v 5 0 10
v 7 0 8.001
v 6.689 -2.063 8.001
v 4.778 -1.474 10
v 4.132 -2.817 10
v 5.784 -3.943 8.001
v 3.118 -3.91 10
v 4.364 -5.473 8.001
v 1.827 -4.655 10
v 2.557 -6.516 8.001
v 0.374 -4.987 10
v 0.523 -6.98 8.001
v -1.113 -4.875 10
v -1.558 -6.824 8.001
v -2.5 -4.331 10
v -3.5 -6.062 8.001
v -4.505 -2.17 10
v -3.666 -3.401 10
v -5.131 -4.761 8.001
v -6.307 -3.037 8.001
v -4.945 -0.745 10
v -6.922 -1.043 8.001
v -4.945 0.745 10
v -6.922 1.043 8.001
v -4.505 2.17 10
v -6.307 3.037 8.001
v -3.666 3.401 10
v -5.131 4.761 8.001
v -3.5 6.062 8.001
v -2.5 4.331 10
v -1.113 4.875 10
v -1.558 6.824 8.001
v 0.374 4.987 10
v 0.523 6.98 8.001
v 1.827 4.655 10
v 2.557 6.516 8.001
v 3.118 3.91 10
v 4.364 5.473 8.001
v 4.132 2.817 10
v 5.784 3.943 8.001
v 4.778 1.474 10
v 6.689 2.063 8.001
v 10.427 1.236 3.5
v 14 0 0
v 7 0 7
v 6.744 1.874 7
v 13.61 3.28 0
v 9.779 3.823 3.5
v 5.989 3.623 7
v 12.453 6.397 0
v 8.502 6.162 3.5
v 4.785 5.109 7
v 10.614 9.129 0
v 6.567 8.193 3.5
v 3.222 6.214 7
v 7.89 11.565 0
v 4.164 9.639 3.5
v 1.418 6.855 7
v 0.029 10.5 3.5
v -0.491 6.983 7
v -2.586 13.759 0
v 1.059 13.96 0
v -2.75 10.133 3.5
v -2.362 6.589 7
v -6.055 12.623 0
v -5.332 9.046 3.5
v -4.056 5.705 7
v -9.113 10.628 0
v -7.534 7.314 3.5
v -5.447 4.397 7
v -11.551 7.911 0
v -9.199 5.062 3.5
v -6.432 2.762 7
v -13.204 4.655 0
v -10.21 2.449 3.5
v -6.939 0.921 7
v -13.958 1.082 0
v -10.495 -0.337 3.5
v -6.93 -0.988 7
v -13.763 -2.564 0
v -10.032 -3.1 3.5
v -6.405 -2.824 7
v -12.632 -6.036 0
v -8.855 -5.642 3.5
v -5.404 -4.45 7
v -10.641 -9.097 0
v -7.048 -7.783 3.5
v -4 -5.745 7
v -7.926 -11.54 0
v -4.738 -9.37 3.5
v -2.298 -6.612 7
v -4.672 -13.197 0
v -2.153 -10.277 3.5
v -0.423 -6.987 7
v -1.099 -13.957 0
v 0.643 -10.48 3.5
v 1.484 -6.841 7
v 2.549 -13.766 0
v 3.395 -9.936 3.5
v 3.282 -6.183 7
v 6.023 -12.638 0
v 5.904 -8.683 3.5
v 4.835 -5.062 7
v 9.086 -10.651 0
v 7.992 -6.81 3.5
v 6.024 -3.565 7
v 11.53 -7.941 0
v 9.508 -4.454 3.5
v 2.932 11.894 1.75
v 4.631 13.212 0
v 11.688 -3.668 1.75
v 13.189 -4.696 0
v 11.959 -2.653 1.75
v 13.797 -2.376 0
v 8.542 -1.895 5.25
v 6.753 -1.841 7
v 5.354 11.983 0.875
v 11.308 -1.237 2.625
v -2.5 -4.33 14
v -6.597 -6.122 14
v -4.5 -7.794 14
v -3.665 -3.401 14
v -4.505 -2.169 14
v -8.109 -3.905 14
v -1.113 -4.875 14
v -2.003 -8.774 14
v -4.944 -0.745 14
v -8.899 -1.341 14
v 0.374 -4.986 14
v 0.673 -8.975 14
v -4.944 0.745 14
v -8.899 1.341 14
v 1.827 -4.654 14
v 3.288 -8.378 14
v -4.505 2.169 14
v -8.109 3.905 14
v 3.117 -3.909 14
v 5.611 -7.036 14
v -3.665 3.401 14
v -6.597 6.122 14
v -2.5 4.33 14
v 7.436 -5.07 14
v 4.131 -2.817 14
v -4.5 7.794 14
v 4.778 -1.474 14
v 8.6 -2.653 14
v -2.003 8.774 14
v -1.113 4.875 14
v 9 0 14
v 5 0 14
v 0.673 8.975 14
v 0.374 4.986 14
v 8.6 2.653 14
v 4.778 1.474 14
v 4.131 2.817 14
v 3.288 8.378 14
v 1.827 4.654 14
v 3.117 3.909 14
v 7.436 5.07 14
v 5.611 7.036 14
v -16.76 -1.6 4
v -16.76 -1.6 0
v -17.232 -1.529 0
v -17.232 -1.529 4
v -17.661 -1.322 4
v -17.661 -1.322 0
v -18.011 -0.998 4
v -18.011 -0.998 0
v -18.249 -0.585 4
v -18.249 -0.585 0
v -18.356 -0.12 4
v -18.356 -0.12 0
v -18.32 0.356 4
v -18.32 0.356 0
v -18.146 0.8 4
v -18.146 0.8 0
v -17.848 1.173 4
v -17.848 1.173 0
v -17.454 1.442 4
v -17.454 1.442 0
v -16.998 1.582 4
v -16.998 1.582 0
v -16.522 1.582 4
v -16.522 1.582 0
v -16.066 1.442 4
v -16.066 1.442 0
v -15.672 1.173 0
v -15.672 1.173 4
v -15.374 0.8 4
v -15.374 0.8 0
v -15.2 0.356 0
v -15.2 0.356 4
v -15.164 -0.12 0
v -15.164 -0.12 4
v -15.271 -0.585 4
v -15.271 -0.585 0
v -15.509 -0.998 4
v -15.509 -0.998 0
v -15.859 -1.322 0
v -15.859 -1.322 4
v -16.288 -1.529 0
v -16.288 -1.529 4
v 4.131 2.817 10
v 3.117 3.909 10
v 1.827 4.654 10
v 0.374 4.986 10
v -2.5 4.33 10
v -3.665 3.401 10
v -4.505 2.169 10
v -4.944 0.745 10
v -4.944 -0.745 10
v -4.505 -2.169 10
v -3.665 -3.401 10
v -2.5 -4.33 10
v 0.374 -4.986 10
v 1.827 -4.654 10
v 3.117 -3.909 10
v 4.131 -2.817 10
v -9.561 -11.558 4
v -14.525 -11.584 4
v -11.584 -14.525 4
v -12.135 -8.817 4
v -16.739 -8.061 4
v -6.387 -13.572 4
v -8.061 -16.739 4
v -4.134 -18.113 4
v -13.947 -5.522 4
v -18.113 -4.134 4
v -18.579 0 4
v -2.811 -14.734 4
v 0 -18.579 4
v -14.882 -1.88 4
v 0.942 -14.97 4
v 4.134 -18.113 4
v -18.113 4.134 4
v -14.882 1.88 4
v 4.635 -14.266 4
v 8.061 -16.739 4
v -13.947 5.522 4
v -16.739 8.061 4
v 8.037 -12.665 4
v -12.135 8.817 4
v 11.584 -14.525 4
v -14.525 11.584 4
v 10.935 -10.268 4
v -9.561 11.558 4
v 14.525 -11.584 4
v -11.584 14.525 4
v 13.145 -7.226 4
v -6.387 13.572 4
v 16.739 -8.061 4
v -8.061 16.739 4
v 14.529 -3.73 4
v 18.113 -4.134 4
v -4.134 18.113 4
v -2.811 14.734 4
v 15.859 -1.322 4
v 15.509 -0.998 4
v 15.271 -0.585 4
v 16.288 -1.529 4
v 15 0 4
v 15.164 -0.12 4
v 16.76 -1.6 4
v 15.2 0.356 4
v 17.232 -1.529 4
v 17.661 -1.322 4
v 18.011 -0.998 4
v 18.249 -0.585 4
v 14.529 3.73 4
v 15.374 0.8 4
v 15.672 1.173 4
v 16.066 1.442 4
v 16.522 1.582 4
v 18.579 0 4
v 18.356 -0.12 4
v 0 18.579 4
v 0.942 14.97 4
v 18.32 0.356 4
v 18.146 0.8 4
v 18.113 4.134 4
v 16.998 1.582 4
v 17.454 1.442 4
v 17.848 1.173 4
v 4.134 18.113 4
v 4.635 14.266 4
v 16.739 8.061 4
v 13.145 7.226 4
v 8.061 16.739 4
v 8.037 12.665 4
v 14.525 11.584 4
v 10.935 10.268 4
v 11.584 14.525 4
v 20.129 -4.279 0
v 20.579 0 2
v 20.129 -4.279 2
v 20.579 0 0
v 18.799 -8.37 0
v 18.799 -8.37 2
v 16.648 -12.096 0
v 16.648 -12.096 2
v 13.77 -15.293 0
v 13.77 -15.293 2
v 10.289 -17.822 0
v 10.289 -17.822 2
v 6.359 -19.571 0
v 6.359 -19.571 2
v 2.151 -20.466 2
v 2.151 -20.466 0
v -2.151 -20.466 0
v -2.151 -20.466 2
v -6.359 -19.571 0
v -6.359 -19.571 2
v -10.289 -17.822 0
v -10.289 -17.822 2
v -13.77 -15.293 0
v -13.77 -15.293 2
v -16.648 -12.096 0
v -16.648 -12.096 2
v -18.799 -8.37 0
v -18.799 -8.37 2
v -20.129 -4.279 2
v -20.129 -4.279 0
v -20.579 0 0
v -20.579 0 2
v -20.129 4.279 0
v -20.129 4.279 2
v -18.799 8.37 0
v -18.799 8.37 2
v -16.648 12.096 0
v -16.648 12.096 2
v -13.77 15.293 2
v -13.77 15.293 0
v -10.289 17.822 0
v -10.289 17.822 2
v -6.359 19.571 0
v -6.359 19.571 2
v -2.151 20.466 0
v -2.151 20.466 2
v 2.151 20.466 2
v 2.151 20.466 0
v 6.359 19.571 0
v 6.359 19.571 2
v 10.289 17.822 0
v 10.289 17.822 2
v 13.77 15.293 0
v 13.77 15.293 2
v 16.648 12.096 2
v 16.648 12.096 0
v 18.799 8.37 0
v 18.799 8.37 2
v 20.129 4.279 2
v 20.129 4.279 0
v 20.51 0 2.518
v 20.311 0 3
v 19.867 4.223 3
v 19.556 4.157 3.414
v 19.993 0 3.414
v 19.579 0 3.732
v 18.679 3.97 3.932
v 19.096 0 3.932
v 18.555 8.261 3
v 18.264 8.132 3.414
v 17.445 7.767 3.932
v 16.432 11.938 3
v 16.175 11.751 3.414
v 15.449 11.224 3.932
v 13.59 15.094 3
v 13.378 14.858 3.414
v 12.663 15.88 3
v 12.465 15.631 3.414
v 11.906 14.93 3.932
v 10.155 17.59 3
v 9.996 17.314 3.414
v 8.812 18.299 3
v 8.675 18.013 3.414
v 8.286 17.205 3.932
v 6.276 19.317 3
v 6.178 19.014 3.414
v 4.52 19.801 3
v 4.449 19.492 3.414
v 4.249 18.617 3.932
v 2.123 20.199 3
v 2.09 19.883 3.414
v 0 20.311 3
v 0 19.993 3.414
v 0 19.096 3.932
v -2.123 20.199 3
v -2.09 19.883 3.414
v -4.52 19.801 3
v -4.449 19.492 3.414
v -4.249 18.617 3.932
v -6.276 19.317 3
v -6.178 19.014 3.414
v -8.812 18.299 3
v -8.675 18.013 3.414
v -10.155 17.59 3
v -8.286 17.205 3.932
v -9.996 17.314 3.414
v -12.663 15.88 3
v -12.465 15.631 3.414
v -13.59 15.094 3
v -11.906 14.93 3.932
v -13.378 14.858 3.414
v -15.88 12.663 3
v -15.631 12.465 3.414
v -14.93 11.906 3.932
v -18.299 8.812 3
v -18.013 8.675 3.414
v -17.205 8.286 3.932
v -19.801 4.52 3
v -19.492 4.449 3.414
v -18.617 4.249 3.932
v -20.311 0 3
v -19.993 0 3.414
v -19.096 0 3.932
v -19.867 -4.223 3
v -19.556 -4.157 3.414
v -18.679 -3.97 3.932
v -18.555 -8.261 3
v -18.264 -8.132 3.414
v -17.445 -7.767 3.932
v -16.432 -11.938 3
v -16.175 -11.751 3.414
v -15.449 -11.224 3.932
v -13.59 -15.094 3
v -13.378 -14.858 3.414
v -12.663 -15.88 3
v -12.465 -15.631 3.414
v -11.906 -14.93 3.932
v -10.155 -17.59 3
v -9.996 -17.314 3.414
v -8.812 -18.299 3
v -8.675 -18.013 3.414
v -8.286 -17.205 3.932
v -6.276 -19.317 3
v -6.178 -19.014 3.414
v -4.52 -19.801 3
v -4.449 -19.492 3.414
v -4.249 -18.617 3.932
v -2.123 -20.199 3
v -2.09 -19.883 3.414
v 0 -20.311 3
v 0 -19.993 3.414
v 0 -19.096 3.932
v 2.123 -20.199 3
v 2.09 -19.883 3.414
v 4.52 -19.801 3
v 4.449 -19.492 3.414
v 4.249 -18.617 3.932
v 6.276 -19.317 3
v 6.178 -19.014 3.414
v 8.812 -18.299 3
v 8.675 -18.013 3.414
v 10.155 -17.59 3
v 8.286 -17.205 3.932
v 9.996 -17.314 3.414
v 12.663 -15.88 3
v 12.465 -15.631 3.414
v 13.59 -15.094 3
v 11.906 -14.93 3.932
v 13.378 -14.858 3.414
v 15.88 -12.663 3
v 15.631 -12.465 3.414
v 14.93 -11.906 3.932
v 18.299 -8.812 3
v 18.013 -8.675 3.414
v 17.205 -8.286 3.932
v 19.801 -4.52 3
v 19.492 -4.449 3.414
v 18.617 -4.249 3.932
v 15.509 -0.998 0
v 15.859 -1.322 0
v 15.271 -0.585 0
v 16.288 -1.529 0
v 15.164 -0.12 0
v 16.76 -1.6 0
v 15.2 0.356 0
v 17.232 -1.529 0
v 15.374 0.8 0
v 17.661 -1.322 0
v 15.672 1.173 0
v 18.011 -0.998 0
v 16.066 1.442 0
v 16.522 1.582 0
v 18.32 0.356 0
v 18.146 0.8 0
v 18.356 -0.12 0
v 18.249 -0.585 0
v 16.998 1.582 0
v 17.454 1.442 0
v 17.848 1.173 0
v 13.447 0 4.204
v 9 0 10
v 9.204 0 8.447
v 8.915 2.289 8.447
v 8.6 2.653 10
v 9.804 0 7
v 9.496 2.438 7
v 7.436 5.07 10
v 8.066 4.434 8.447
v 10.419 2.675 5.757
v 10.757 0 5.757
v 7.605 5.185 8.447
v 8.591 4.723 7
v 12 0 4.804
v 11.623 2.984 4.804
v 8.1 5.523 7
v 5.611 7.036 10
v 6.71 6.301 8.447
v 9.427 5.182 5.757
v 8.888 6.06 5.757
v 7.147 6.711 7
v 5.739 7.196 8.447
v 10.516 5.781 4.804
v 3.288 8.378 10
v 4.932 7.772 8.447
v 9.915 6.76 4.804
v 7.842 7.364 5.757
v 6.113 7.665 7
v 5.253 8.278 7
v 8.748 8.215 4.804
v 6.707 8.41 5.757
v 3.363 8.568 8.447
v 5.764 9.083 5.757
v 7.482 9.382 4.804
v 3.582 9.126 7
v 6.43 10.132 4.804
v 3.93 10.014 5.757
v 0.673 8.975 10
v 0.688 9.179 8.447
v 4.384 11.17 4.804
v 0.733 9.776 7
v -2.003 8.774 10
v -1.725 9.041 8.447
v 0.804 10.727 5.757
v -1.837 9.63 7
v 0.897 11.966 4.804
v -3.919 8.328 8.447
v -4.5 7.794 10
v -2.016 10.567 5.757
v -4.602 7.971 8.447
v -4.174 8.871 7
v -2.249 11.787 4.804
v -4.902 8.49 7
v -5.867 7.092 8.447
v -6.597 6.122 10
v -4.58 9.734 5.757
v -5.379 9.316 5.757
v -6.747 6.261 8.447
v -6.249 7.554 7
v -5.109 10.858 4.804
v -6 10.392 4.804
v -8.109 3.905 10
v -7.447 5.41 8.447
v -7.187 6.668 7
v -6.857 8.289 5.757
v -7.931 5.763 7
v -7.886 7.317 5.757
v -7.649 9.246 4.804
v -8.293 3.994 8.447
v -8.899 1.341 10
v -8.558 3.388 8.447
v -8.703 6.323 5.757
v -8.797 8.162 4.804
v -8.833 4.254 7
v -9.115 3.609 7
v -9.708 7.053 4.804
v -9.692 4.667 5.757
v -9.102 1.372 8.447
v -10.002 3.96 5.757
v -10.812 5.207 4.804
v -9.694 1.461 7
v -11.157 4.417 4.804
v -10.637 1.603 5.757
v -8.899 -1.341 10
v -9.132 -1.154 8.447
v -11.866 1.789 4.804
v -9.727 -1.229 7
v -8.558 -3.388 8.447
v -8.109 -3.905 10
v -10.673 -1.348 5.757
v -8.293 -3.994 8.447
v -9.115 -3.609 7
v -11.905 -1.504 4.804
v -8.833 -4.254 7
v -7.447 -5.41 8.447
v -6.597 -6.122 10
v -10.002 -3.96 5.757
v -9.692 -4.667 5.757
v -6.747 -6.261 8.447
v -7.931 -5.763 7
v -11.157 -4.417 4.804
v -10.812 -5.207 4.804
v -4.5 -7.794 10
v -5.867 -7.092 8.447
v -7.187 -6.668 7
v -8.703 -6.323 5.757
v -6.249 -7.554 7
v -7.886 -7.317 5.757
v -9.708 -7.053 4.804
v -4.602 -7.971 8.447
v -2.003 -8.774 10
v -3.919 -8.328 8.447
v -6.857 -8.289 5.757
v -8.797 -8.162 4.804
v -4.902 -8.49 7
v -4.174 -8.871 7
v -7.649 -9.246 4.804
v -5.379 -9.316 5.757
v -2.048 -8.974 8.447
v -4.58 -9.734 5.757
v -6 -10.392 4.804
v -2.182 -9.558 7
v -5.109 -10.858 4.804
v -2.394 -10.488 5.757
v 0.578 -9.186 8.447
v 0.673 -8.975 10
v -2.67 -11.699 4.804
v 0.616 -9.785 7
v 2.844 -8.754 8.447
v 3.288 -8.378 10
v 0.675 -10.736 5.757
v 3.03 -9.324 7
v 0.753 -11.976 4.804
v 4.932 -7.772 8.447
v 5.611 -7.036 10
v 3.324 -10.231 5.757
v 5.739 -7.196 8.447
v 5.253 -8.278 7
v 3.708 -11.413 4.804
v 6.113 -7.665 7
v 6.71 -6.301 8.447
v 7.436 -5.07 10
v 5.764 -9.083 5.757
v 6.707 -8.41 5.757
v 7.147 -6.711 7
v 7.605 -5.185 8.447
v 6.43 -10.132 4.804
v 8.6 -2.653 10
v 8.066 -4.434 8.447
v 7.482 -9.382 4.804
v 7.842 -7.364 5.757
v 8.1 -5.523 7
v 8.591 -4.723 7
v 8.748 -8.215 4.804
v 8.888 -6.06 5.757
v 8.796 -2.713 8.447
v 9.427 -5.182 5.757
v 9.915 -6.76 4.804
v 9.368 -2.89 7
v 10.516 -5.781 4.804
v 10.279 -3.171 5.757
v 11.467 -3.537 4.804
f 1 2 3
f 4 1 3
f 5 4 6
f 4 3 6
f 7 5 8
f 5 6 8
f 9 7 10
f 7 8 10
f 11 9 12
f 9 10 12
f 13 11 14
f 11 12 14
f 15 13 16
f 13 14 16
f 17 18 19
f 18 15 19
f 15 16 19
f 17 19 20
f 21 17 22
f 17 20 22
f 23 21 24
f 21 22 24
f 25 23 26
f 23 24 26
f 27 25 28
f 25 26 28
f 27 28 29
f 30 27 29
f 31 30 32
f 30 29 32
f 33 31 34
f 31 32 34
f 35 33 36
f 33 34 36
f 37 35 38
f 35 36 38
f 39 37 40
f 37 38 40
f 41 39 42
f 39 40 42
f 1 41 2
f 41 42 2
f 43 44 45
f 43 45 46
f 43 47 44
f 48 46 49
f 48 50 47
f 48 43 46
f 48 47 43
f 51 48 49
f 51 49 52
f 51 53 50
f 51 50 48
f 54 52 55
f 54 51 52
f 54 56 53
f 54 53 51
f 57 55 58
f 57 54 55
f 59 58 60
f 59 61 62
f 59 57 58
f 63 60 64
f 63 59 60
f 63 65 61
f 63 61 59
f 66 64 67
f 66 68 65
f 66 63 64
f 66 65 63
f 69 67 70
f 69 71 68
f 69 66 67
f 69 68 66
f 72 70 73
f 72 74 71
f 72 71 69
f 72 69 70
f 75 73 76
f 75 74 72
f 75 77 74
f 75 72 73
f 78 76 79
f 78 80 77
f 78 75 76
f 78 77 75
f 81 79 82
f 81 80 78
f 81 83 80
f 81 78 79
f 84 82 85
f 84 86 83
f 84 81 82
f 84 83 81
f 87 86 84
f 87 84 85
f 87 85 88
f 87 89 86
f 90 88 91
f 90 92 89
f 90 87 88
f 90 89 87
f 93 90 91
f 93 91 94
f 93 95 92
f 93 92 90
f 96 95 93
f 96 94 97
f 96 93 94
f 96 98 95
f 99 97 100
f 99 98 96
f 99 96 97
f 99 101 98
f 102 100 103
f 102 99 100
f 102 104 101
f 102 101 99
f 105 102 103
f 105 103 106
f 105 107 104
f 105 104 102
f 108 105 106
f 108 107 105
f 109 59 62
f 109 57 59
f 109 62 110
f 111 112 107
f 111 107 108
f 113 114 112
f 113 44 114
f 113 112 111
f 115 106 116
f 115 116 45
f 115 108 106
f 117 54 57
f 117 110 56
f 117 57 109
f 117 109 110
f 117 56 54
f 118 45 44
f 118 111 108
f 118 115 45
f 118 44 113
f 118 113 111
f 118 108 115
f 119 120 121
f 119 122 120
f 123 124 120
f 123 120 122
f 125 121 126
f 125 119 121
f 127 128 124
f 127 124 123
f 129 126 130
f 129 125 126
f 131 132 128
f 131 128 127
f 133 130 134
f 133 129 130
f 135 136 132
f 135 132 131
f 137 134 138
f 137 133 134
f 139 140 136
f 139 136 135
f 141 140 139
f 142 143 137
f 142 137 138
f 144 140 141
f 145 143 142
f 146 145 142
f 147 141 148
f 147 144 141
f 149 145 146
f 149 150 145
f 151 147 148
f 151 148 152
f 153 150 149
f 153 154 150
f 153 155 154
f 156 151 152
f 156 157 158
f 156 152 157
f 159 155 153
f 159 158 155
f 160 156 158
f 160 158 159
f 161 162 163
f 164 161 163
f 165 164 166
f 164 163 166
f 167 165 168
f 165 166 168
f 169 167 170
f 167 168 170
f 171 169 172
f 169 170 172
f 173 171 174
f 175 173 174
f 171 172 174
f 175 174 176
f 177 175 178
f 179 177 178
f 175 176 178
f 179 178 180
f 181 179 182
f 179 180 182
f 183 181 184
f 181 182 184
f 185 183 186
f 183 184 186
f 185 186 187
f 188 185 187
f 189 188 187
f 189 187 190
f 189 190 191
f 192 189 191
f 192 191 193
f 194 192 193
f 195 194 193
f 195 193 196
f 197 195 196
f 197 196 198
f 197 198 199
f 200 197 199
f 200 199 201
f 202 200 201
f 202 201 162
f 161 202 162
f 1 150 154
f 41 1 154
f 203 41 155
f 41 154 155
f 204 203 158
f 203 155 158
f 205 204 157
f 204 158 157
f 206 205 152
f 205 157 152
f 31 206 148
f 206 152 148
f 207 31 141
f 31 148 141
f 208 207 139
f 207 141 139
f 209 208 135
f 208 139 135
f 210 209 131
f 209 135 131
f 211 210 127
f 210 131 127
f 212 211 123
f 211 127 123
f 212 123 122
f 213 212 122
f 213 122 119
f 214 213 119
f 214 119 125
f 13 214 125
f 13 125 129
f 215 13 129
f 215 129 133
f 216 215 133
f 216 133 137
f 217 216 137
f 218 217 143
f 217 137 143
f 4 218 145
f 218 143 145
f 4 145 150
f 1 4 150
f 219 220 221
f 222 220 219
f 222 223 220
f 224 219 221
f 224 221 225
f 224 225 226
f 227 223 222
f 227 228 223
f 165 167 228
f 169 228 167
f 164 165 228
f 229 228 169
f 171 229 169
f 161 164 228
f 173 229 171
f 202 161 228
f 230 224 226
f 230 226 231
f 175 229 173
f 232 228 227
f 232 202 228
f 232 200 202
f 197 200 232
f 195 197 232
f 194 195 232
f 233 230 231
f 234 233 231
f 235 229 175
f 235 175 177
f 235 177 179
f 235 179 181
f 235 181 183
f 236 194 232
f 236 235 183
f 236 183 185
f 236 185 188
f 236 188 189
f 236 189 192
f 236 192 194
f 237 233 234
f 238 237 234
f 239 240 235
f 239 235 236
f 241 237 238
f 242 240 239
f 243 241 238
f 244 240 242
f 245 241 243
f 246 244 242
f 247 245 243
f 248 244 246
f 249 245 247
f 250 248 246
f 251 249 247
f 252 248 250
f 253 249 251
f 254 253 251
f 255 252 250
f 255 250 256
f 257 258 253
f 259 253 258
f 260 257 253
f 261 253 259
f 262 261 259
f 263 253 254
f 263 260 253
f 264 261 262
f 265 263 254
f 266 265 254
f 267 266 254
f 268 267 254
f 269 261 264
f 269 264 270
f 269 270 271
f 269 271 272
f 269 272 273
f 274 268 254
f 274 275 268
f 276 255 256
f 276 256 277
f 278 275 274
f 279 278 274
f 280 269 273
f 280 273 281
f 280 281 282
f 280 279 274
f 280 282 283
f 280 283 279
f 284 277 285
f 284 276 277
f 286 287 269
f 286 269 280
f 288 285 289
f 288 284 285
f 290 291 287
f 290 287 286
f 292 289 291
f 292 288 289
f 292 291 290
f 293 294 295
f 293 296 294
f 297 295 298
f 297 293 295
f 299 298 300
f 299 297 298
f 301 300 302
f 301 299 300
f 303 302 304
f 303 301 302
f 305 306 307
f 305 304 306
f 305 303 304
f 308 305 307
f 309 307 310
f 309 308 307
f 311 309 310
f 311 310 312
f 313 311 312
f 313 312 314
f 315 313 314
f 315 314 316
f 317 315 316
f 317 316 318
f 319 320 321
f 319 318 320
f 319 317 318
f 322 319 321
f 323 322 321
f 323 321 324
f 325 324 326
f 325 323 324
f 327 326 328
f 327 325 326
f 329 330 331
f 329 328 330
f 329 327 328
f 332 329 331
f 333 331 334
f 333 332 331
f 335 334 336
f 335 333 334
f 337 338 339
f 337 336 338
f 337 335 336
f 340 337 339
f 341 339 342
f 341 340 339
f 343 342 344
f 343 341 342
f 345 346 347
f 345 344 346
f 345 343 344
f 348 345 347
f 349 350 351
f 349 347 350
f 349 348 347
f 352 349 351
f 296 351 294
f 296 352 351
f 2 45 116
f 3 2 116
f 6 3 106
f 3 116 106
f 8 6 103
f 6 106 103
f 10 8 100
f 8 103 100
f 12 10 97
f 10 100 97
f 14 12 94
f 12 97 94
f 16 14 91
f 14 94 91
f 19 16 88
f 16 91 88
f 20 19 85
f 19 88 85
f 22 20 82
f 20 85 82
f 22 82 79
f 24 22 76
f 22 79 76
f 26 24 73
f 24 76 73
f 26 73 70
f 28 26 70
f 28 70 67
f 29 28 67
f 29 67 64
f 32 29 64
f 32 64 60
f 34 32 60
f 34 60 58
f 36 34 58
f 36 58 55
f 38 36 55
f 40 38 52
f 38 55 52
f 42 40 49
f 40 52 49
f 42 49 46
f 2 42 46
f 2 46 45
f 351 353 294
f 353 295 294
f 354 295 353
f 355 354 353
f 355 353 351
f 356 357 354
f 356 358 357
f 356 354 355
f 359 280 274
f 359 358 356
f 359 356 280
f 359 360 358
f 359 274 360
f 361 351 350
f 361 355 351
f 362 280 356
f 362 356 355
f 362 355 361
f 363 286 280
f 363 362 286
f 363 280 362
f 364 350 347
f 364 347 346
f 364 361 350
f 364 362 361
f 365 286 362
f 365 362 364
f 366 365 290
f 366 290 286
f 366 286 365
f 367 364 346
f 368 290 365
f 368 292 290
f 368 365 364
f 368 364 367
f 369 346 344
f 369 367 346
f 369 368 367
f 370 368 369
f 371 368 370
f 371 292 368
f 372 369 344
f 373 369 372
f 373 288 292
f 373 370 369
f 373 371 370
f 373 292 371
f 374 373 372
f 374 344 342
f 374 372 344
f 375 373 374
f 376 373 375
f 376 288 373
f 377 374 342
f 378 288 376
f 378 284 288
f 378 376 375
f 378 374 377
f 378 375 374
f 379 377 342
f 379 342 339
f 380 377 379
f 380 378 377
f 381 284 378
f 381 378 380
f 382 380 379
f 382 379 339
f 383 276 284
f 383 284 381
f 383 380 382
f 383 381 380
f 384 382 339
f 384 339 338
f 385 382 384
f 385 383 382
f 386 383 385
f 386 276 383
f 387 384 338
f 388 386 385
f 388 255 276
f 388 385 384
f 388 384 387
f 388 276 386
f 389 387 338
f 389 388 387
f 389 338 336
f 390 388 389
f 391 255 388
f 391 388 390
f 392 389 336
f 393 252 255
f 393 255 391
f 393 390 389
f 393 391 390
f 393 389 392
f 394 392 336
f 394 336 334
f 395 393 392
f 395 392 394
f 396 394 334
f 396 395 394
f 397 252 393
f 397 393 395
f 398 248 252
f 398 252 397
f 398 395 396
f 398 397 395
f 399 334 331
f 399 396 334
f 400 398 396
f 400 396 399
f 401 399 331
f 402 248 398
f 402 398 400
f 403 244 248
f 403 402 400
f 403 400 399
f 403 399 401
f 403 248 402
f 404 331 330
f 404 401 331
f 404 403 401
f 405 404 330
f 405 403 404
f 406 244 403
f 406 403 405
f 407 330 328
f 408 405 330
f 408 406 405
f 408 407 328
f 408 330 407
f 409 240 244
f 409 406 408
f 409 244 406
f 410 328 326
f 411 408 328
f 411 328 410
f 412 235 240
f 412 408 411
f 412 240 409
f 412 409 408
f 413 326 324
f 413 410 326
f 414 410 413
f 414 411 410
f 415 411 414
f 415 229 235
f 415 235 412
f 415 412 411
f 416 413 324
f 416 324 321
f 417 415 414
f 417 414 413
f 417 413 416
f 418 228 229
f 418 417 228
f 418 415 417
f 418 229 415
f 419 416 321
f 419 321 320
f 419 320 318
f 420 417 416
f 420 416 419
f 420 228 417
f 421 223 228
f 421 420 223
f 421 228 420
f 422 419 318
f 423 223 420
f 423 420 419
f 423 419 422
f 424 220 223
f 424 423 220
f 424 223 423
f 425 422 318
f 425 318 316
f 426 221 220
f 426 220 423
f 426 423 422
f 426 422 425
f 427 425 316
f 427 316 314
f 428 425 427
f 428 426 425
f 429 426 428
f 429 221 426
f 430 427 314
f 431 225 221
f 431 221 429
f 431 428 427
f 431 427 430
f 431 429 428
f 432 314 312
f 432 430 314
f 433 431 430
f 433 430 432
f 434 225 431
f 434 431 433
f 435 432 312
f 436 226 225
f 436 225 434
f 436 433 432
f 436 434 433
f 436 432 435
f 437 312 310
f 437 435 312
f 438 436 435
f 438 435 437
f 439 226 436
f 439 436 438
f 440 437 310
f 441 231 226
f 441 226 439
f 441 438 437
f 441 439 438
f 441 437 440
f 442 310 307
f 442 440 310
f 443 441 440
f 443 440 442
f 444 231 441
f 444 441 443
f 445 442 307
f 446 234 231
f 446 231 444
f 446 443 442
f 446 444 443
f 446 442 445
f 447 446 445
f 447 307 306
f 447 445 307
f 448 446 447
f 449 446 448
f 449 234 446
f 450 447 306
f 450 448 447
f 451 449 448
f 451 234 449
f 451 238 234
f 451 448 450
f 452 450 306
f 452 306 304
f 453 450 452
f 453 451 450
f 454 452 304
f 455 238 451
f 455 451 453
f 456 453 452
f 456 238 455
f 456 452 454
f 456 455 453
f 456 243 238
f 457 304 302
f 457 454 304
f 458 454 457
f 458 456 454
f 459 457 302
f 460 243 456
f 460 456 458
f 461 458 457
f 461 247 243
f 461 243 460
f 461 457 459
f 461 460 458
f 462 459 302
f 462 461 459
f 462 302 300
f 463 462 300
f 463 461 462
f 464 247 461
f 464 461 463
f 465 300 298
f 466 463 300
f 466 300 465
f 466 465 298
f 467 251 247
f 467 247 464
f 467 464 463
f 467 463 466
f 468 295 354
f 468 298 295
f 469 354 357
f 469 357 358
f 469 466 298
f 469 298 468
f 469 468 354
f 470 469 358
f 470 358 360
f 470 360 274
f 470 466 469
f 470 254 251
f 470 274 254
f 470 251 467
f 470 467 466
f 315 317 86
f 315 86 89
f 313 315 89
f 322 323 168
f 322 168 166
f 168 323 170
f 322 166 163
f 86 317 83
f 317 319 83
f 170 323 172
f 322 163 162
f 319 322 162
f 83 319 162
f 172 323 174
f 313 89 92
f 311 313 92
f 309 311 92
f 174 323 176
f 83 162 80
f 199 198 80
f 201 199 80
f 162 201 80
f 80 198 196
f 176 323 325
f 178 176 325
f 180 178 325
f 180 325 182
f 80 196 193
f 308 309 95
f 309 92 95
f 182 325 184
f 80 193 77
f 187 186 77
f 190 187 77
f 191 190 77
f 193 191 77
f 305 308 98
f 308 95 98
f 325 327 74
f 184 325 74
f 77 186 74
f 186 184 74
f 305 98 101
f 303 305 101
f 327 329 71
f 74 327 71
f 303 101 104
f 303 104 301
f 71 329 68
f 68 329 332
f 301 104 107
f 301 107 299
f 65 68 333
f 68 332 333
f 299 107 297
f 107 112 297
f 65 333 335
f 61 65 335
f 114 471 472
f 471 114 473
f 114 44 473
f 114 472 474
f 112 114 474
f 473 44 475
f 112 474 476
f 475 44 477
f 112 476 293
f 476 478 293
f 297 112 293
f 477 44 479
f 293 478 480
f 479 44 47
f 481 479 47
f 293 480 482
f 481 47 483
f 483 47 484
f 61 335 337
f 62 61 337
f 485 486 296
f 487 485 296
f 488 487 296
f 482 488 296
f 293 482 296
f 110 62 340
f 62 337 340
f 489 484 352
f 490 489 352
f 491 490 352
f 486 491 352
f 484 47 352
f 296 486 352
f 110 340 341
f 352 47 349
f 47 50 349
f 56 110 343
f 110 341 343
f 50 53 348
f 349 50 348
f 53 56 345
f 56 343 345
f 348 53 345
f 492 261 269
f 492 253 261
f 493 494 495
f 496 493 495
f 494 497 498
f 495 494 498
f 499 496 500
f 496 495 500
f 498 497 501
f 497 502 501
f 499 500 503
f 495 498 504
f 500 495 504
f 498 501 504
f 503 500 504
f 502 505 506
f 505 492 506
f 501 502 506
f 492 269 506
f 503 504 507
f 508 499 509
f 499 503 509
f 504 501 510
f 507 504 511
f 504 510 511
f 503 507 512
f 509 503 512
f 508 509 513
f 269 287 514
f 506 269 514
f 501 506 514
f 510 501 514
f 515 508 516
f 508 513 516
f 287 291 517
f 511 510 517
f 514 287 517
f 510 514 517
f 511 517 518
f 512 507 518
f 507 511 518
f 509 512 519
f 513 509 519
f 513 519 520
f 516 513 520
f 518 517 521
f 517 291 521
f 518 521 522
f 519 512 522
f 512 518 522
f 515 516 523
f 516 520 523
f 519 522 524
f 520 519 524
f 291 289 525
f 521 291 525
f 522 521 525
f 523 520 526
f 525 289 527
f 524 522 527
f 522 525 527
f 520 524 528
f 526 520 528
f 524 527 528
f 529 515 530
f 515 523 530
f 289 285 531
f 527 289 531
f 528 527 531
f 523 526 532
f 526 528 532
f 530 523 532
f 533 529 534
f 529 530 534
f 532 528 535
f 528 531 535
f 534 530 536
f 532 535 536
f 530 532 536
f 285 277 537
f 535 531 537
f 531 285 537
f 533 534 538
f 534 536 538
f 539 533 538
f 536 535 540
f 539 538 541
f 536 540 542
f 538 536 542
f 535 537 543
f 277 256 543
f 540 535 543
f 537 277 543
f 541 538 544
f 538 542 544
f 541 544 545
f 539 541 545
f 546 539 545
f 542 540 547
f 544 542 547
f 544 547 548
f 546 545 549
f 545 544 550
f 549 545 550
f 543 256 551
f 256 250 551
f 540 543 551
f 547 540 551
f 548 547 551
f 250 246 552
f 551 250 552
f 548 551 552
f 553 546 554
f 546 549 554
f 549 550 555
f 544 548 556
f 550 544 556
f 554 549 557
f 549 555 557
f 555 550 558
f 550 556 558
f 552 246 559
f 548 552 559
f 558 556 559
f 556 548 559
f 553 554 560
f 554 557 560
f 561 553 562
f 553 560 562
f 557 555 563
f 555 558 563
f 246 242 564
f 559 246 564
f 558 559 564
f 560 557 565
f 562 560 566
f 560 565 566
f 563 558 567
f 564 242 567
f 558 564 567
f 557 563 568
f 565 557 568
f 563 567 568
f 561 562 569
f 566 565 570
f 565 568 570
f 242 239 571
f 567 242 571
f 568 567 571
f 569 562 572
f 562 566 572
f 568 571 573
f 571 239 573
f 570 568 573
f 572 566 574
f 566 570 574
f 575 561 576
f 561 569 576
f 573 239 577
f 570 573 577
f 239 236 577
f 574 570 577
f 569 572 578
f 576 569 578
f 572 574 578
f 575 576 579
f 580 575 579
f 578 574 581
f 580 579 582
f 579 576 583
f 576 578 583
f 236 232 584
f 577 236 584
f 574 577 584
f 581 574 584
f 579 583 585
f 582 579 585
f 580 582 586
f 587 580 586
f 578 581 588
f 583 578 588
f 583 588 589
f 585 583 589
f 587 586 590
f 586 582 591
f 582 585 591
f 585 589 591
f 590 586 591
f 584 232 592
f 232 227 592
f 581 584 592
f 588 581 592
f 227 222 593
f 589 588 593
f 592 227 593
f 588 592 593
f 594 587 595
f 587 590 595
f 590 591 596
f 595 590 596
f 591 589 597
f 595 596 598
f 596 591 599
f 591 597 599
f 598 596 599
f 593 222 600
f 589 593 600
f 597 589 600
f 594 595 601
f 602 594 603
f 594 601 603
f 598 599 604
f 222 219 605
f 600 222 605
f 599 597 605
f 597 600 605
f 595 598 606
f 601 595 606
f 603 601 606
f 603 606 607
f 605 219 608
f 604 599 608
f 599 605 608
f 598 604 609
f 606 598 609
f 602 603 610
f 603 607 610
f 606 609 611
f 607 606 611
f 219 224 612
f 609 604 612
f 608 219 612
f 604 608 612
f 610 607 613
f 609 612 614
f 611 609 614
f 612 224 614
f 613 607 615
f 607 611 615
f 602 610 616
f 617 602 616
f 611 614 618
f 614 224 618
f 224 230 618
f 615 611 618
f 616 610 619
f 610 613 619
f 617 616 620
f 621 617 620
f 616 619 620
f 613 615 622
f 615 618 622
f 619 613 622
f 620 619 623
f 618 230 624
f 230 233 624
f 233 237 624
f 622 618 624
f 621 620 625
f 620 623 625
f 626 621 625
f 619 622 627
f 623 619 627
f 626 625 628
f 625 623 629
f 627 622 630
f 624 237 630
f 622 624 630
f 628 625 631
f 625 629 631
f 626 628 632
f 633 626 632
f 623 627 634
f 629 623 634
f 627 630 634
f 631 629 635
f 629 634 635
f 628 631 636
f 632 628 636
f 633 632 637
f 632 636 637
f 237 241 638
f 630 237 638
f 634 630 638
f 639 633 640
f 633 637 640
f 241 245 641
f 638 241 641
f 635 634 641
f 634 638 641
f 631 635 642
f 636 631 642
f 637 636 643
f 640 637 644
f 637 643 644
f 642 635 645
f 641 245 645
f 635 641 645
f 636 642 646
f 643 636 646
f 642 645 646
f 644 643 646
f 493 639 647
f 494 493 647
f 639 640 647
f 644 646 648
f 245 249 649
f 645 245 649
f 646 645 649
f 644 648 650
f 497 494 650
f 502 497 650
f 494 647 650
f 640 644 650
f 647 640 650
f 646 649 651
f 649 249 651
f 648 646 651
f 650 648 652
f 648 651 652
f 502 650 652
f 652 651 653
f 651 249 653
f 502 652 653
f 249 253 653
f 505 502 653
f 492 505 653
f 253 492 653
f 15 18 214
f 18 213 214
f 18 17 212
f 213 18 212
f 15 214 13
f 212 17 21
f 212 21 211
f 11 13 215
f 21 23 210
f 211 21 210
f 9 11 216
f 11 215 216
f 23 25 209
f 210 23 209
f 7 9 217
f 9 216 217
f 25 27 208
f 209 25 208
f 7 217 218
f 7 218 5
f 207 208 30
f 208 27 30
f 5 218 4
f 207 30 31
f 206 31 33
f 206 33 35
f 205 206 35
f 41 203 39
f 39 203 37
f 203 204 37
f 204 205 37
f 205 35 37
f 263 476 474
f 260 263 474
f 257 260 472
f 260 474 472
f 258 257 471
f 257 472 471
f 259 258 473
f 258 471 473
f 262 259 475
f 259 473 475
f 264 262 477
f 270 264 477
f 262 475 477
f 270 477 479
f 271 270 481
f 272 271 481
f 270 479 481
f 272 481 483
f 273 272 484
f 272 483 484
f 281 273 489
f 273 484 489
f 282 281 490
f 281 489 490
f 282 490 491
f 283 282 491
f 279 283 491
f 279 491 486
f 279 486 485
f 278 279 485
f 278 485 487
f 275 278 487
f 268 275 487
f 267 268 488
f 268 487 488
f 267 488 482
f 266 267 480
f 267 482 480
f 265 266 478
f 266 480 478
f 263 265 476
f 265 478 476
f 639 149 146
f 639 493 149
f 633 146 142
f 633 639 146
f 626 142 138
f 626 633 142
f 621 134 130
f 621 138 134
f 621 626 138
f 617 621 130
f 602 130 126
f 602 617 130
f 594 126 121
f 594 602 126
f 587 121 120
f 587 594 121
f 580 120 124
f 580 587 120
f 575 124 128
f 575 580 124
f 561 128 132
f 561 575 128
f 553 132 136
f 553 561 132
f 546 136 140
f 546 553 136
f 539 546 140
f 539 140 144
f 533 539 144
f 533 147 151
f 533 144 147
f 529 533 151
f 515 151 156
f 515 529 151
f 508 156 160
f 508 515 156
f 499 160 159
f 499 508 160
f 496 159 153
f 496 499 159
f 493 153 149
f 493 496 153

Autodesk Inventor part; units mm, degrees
ref_plane "YZ Plane" through (0, 0, 0) normal (1, 0, 0) x (0, 1, 0)
ref_plane "XZ Plane" through (0, 0, 0) normal (0, 1, 0) x (-1, 0, 0)
ref_plane "XY Plane" through (0, 0, 0) normal (0, 0, 1) x (1, 0, 0)
sketch "Skizze1" plane through (0, 0, 0) normal (0, 0, 1) x (1, 0, 0)
  circle A0 centre (16.76, 0) radius 1.25 projected
  circle A1 centre (-16.76, 0) radius 1.25 projected
  line L0 (-6.25, 16) -> (-11.9414, 16) projected
  line L1 (-2.25, 20) -> (-6.25, 16) projected
  line L2 (2.25, 20) -> (-2.25, 20) projected
  line L3 (6.25, 16) -> (2.25, 20) projected
  line L4 (11.9414, 16) -> (6.25, 16) projected
  line L5 (11.9414, 16) -> (12.9414, 15) projected
  line L6 (12.9414, -15) -> (12.9414, 15) projected
  line L7 (11.9414, -16) -> (12.9414, -15) projected
  line L8 (-11.9414, -16) -> (11.9414, -16) projected
  line L9 (-11.9414, -16) -> (-12.9414, -15) projected
  line L10 (-12.9414, 15) -> (-12.9414, -15) projected
  line L11 (-12.9414, 15) -> (-11.9414, 16) projected
  circle A2 centre (0, 0) radius 20.5786 projected
  point P0 (0, 0)
extrude "Extrusion1" add sketch "Skizze1" along normal blind 4 contours L1 L2 L3 L4 L5 L6 L7 L8 L9 L10 L11 L0 | A2
sketch "Skizze2" plane through (0, 0, 4) normal (0, 0, 1) x (1, 0, 0)
  point P0 (0, 0)
sketch "Skizze3" plane through (0, 0, 4) normal (0, 0, 1) x (1, 0, 0)
  line L0 (-12.1, -11.9394) -> (-9.9, -11.9394)
  line L1 (-9.9, -11.9394) -> (-9.9, 11.9394)
  line L2 (-9.9, 11.9394) -> (-12.1, 11.9394)
  line L3 (-12.1, 11.9394) -> (-12.1, -11.9394)
  line L4 (-7.7, 14.502) -> (-5.5, 14.502)
  line L5 (-5.5, 14.502) -> (-5.5, -14.502)
  line L6 (-5.5, -14.502) -> (-7.7, -14.502)
  line L7 (-7.7, -14.502) -> (-7.7, 14.502)
  line L8 (-3.3, 15.4709) -> (-1.1, 15.4709)
  line L9 (-1.1, 15.4709) -> (-1.1, -15.4709)
  line L10 (-1.1, -15.4709) -> (-3.3, -15.4709)
  line L11 (-3.3, -15.4709) -> (-3.3, 15.4709)
  circle A0 centre (-16.76, 0) radius 1.25 projected
  circle A1 centre (16.76, 0) radius 1.25 projected
  circle A2 centre (0, 0) radius 20.5786 projected
  line L12 (-16.76, 0) -> (0, 0) construction
  circle A3 centre (0, 0) radius 15.51 construction
  line L13 (0, 0) -> (0, 15.51)
  point P0 (0, 0)
  dimension "d2" = 2.2
  dimension "d3" = 2.2
  dimension "d4" = 2.2
  dimension "d5" = 2.2
  dimension "d6" = 2.2
  dimension "d7" = 1.1
ref_plane "Arbeitsebene1" through (0, 0, 4) normal (1, 0, 0) x (0, 1, 0)
extrude "Extrusion2" cut sketch "Skizze3" against normal through all contours L3 L2 L1 L0 | L4 L5 L6 L7 | L8 L9 L10 L11
mirror "Spiegeln1" about plane through (0, 0, 4) normal (1, 0, 0) of "Extrusion2"
sketch "Skizze4" plane through (0, 0, 4) normal (0, 0, 1) x (1, 0, 0)
  line L0 (5.5, -14.502) -> (5.5, 14.502) projected
  line L1 (5.5, 14.502) -> (7.7, 14.502) projected
  line L2 (7.7, 14.502) -> (7.7, -14.502) projected
  line L3 (7.7, -14.502) -> (5.5, -14.502) projected
  line L4 (1.1, -15.4709) -> (1.1, 15.4709) projected
  line L5 (1.1, 15.4709) -> (3.3, 15.4709) projected
  line L6 (3.3, 15.4709) -> (3.3, -15.4709) projected
  line L7 (3.3, -15.4709) -> (1.1, -15.4709) projected
  line L8 (9.9, 11.9394) -> (12.1, 11.9394) projected
  line L9 (12.1, 11.9394) -> (12.1, -11.9394) projected
  line L10 (12.1, -11.9394) -> (9.9, -11.9394) projected
  line L11 (9.9, -11.9394) -> (9.9, 11.9394) projected
  line L12 (-7.7, -14.502) -> (-7.7, 14.502) projected
  line L13 (-7.7, 14.502) -> (-5.5, 14.502) projected
  line L14 (-5.5, 14.502) -> (-5.5, -14.502) projected
  line L15 (-5.5, -14.502) -> (-7.7, -14.502) projected
  line L16 (-9.9, 11.9394) -> (-9.9, -11.9394) projected
  line L17 (-9.9, -11.9394) -> (-12.1, -11.9394) projected
  line L18 (-12.1, -11.9394) -> (-12.1, 11.9394) projected
  line L19 (-12.1, 11.9394) -> (-9.9, 11.9394) projected
  line L20 (-3.3, -15.4709) -> (-3.3, 15.4709) projected
  line L21 (-3.3, 15.4709) -> (-1.1, 15.4709) projected
  line L22 (-1.1, 15.4709) -> (-1.1, -15.4709) projected
  line L23 (-1.1, -15.4709) -> (-3.3, -15.4709) projected
  circle A0 centre (-16.76, 0) radius 1.25 projected
  circle A1 centre (16.76, 0) radius 1.25 projected
  circle A2 centre (0, 0) radius 20.5786 projected
  point P0 (0, 0)
hole "Bohrung1" at (-16.76, 0, 4) at (16.76, 0, 4) direction (0, 0, -1) diameter 3.2 end through all
sketch "Skizze5" plane through (0, 0, 4) normal (0, 0, 1) x (1, 0, 0)
  circle A0 centre (-16.76, 0) radius 1.6 projected
  circle A1 centre (16.76, 0) radius 1.6 projected
  line L0 (5.5, -14.502) -> (5.5, 14.502) projected
  line L1 (5.5, 14.502) -> (7.7, 14.502) projected
  line L2 (7.7, 14.502) -> (7.7, -14.502) projected
  line L3 (7.7, -14.502) -> (5.5, -14.502) projected
  line L4 (1.1, -15.4709) -> (1.1, 15.4709) projected
  line L5 (1.1, 15.4709) -> (3.3, 15.4709) projected
  line L6 (3.3, 15.4709) -> (3.3, -15.4709) projected
  line L7 (3.3, -15.4709) -> (1.1, -15.4709) projected
  line L8 (9.9, 11.9394) -> (12.1, 11.9394) projected
  line L9 (12.1, 11.9394) -> (12.1, -11.9394) projected
  line L10 (12.1, -11.9394) -> (9.9, -11.9394) projected
  line L11 (9.9, -11.9394) -> (9.9, 11.9394) projected
  line L12 (-7.7, -14.502) -> (-7.7, 14.502) projected
  line L13 (-7.7, 14.502) -> (-5.5, 14.502) projected
  line L14 (-5.5, 14.502) -> (-5.5, -14.502) projected
  line L15 (-5.5, -14.502) -> (-7.7, -14.502) projected
  line L16 (-9.9, 11.9394) -> (-9.9, -11.9394) projected
  line L17 (-9.9, -11.9394) -> (-12.1, -11.9394) projected
  line L18 (-12.1, -11.9394) -> (-12.1, 11.9394) projected
  line L19 (-12.1, 11.9394) -> (-9.9, 11.9394) projected
  line L20 (-3.3, -15.4709) -> (-3.3, 15.4709) projected
  line L21 (-3.3, 15.4709) -> (-1.1, 15.4709) projected
  line L22 (-1.1, 15.4709) -> (-1.1, -15.4709) projected
  line L23 (-1.1, -15.4709) -> (-3.3, -15.4709) projected
  circle A2 centre (0, 0) radius 20.5786 projected
  point P0 (0, 0)
extrude "Extrusion3" add sketch "Skizze5" against normal up to surface (4 mm away) contours L0 L1 L2 L3 | L4 L5 L6 L7 | L8 L9 L10 L11 | L12 L13 L14 L15 | L16 L17 L18 L19 | L20 L21 L22 L23
sketch "Skizze6" plane through (0, 0, 4) normal (0, 0, 1) x (1, 0, 0)
  circle A0 centre (0, 0) radius 9
  circle A1 centre (0, 0) radius 7
  dimension "d20" = 18
  dimension "d21" = 2
extrude "Extrusion4" add sketch "Skizze6" along normal blind 10
sketch "Skizze9" plane through (0, 0, 4) normal (0, 0, 1) x (1, 0, 0)
  circle A0 centre (0, 0) radius 7 projected
extrude "Extrusion6" cut sketch "Skizze9" against normal through all
sketch "Skizze10" plane through (0, 0, 14) normal (0, 0, 1) x (1, 0, 0)
  circle A0 centre (0, 0) radius 7 projected
  circle A1 centre (0, 0) radius 9 projected
  circle A2 centre (0, 0) radius 5
  dimension "d28" = 10
extrude "Extrusion7" add sketch "Skizze10" against normal blind 4 contours A0
chamfer "Fase1" distance 2 angle 45 1 edges at (-7, 0, 10)
fillet "Rundung1" radius 6 1 edges at (-9, 0, 4)
sketch "Skizze11" plane through (0, 0, 0) normal (0, 0, -1) x (-1, 0, 0)
  point P0 (0, 0)
chamfer "Fase2" distance 7 angle 45 1 edges at (-7, 0, 0)
fillet "Rundung2" radius 2 1 edges at (-20.5786, 0, 4)
sketch "Skizze7" plane through (0, 0, 14) normal (0, 0, 1) x (1, 0, 0)
  circle A0 centre (0, 0) radius 7 projected
equation "\"d3\" = d2"
equation "\"d4\" = d3"
equation "\"d5\" = d4"
equation "\"d6\" = d3"
equation "\"d7\" = 0.5 * d2"
properties part number "Wrist_Cover_2" material "ABS-Kunststoff"
